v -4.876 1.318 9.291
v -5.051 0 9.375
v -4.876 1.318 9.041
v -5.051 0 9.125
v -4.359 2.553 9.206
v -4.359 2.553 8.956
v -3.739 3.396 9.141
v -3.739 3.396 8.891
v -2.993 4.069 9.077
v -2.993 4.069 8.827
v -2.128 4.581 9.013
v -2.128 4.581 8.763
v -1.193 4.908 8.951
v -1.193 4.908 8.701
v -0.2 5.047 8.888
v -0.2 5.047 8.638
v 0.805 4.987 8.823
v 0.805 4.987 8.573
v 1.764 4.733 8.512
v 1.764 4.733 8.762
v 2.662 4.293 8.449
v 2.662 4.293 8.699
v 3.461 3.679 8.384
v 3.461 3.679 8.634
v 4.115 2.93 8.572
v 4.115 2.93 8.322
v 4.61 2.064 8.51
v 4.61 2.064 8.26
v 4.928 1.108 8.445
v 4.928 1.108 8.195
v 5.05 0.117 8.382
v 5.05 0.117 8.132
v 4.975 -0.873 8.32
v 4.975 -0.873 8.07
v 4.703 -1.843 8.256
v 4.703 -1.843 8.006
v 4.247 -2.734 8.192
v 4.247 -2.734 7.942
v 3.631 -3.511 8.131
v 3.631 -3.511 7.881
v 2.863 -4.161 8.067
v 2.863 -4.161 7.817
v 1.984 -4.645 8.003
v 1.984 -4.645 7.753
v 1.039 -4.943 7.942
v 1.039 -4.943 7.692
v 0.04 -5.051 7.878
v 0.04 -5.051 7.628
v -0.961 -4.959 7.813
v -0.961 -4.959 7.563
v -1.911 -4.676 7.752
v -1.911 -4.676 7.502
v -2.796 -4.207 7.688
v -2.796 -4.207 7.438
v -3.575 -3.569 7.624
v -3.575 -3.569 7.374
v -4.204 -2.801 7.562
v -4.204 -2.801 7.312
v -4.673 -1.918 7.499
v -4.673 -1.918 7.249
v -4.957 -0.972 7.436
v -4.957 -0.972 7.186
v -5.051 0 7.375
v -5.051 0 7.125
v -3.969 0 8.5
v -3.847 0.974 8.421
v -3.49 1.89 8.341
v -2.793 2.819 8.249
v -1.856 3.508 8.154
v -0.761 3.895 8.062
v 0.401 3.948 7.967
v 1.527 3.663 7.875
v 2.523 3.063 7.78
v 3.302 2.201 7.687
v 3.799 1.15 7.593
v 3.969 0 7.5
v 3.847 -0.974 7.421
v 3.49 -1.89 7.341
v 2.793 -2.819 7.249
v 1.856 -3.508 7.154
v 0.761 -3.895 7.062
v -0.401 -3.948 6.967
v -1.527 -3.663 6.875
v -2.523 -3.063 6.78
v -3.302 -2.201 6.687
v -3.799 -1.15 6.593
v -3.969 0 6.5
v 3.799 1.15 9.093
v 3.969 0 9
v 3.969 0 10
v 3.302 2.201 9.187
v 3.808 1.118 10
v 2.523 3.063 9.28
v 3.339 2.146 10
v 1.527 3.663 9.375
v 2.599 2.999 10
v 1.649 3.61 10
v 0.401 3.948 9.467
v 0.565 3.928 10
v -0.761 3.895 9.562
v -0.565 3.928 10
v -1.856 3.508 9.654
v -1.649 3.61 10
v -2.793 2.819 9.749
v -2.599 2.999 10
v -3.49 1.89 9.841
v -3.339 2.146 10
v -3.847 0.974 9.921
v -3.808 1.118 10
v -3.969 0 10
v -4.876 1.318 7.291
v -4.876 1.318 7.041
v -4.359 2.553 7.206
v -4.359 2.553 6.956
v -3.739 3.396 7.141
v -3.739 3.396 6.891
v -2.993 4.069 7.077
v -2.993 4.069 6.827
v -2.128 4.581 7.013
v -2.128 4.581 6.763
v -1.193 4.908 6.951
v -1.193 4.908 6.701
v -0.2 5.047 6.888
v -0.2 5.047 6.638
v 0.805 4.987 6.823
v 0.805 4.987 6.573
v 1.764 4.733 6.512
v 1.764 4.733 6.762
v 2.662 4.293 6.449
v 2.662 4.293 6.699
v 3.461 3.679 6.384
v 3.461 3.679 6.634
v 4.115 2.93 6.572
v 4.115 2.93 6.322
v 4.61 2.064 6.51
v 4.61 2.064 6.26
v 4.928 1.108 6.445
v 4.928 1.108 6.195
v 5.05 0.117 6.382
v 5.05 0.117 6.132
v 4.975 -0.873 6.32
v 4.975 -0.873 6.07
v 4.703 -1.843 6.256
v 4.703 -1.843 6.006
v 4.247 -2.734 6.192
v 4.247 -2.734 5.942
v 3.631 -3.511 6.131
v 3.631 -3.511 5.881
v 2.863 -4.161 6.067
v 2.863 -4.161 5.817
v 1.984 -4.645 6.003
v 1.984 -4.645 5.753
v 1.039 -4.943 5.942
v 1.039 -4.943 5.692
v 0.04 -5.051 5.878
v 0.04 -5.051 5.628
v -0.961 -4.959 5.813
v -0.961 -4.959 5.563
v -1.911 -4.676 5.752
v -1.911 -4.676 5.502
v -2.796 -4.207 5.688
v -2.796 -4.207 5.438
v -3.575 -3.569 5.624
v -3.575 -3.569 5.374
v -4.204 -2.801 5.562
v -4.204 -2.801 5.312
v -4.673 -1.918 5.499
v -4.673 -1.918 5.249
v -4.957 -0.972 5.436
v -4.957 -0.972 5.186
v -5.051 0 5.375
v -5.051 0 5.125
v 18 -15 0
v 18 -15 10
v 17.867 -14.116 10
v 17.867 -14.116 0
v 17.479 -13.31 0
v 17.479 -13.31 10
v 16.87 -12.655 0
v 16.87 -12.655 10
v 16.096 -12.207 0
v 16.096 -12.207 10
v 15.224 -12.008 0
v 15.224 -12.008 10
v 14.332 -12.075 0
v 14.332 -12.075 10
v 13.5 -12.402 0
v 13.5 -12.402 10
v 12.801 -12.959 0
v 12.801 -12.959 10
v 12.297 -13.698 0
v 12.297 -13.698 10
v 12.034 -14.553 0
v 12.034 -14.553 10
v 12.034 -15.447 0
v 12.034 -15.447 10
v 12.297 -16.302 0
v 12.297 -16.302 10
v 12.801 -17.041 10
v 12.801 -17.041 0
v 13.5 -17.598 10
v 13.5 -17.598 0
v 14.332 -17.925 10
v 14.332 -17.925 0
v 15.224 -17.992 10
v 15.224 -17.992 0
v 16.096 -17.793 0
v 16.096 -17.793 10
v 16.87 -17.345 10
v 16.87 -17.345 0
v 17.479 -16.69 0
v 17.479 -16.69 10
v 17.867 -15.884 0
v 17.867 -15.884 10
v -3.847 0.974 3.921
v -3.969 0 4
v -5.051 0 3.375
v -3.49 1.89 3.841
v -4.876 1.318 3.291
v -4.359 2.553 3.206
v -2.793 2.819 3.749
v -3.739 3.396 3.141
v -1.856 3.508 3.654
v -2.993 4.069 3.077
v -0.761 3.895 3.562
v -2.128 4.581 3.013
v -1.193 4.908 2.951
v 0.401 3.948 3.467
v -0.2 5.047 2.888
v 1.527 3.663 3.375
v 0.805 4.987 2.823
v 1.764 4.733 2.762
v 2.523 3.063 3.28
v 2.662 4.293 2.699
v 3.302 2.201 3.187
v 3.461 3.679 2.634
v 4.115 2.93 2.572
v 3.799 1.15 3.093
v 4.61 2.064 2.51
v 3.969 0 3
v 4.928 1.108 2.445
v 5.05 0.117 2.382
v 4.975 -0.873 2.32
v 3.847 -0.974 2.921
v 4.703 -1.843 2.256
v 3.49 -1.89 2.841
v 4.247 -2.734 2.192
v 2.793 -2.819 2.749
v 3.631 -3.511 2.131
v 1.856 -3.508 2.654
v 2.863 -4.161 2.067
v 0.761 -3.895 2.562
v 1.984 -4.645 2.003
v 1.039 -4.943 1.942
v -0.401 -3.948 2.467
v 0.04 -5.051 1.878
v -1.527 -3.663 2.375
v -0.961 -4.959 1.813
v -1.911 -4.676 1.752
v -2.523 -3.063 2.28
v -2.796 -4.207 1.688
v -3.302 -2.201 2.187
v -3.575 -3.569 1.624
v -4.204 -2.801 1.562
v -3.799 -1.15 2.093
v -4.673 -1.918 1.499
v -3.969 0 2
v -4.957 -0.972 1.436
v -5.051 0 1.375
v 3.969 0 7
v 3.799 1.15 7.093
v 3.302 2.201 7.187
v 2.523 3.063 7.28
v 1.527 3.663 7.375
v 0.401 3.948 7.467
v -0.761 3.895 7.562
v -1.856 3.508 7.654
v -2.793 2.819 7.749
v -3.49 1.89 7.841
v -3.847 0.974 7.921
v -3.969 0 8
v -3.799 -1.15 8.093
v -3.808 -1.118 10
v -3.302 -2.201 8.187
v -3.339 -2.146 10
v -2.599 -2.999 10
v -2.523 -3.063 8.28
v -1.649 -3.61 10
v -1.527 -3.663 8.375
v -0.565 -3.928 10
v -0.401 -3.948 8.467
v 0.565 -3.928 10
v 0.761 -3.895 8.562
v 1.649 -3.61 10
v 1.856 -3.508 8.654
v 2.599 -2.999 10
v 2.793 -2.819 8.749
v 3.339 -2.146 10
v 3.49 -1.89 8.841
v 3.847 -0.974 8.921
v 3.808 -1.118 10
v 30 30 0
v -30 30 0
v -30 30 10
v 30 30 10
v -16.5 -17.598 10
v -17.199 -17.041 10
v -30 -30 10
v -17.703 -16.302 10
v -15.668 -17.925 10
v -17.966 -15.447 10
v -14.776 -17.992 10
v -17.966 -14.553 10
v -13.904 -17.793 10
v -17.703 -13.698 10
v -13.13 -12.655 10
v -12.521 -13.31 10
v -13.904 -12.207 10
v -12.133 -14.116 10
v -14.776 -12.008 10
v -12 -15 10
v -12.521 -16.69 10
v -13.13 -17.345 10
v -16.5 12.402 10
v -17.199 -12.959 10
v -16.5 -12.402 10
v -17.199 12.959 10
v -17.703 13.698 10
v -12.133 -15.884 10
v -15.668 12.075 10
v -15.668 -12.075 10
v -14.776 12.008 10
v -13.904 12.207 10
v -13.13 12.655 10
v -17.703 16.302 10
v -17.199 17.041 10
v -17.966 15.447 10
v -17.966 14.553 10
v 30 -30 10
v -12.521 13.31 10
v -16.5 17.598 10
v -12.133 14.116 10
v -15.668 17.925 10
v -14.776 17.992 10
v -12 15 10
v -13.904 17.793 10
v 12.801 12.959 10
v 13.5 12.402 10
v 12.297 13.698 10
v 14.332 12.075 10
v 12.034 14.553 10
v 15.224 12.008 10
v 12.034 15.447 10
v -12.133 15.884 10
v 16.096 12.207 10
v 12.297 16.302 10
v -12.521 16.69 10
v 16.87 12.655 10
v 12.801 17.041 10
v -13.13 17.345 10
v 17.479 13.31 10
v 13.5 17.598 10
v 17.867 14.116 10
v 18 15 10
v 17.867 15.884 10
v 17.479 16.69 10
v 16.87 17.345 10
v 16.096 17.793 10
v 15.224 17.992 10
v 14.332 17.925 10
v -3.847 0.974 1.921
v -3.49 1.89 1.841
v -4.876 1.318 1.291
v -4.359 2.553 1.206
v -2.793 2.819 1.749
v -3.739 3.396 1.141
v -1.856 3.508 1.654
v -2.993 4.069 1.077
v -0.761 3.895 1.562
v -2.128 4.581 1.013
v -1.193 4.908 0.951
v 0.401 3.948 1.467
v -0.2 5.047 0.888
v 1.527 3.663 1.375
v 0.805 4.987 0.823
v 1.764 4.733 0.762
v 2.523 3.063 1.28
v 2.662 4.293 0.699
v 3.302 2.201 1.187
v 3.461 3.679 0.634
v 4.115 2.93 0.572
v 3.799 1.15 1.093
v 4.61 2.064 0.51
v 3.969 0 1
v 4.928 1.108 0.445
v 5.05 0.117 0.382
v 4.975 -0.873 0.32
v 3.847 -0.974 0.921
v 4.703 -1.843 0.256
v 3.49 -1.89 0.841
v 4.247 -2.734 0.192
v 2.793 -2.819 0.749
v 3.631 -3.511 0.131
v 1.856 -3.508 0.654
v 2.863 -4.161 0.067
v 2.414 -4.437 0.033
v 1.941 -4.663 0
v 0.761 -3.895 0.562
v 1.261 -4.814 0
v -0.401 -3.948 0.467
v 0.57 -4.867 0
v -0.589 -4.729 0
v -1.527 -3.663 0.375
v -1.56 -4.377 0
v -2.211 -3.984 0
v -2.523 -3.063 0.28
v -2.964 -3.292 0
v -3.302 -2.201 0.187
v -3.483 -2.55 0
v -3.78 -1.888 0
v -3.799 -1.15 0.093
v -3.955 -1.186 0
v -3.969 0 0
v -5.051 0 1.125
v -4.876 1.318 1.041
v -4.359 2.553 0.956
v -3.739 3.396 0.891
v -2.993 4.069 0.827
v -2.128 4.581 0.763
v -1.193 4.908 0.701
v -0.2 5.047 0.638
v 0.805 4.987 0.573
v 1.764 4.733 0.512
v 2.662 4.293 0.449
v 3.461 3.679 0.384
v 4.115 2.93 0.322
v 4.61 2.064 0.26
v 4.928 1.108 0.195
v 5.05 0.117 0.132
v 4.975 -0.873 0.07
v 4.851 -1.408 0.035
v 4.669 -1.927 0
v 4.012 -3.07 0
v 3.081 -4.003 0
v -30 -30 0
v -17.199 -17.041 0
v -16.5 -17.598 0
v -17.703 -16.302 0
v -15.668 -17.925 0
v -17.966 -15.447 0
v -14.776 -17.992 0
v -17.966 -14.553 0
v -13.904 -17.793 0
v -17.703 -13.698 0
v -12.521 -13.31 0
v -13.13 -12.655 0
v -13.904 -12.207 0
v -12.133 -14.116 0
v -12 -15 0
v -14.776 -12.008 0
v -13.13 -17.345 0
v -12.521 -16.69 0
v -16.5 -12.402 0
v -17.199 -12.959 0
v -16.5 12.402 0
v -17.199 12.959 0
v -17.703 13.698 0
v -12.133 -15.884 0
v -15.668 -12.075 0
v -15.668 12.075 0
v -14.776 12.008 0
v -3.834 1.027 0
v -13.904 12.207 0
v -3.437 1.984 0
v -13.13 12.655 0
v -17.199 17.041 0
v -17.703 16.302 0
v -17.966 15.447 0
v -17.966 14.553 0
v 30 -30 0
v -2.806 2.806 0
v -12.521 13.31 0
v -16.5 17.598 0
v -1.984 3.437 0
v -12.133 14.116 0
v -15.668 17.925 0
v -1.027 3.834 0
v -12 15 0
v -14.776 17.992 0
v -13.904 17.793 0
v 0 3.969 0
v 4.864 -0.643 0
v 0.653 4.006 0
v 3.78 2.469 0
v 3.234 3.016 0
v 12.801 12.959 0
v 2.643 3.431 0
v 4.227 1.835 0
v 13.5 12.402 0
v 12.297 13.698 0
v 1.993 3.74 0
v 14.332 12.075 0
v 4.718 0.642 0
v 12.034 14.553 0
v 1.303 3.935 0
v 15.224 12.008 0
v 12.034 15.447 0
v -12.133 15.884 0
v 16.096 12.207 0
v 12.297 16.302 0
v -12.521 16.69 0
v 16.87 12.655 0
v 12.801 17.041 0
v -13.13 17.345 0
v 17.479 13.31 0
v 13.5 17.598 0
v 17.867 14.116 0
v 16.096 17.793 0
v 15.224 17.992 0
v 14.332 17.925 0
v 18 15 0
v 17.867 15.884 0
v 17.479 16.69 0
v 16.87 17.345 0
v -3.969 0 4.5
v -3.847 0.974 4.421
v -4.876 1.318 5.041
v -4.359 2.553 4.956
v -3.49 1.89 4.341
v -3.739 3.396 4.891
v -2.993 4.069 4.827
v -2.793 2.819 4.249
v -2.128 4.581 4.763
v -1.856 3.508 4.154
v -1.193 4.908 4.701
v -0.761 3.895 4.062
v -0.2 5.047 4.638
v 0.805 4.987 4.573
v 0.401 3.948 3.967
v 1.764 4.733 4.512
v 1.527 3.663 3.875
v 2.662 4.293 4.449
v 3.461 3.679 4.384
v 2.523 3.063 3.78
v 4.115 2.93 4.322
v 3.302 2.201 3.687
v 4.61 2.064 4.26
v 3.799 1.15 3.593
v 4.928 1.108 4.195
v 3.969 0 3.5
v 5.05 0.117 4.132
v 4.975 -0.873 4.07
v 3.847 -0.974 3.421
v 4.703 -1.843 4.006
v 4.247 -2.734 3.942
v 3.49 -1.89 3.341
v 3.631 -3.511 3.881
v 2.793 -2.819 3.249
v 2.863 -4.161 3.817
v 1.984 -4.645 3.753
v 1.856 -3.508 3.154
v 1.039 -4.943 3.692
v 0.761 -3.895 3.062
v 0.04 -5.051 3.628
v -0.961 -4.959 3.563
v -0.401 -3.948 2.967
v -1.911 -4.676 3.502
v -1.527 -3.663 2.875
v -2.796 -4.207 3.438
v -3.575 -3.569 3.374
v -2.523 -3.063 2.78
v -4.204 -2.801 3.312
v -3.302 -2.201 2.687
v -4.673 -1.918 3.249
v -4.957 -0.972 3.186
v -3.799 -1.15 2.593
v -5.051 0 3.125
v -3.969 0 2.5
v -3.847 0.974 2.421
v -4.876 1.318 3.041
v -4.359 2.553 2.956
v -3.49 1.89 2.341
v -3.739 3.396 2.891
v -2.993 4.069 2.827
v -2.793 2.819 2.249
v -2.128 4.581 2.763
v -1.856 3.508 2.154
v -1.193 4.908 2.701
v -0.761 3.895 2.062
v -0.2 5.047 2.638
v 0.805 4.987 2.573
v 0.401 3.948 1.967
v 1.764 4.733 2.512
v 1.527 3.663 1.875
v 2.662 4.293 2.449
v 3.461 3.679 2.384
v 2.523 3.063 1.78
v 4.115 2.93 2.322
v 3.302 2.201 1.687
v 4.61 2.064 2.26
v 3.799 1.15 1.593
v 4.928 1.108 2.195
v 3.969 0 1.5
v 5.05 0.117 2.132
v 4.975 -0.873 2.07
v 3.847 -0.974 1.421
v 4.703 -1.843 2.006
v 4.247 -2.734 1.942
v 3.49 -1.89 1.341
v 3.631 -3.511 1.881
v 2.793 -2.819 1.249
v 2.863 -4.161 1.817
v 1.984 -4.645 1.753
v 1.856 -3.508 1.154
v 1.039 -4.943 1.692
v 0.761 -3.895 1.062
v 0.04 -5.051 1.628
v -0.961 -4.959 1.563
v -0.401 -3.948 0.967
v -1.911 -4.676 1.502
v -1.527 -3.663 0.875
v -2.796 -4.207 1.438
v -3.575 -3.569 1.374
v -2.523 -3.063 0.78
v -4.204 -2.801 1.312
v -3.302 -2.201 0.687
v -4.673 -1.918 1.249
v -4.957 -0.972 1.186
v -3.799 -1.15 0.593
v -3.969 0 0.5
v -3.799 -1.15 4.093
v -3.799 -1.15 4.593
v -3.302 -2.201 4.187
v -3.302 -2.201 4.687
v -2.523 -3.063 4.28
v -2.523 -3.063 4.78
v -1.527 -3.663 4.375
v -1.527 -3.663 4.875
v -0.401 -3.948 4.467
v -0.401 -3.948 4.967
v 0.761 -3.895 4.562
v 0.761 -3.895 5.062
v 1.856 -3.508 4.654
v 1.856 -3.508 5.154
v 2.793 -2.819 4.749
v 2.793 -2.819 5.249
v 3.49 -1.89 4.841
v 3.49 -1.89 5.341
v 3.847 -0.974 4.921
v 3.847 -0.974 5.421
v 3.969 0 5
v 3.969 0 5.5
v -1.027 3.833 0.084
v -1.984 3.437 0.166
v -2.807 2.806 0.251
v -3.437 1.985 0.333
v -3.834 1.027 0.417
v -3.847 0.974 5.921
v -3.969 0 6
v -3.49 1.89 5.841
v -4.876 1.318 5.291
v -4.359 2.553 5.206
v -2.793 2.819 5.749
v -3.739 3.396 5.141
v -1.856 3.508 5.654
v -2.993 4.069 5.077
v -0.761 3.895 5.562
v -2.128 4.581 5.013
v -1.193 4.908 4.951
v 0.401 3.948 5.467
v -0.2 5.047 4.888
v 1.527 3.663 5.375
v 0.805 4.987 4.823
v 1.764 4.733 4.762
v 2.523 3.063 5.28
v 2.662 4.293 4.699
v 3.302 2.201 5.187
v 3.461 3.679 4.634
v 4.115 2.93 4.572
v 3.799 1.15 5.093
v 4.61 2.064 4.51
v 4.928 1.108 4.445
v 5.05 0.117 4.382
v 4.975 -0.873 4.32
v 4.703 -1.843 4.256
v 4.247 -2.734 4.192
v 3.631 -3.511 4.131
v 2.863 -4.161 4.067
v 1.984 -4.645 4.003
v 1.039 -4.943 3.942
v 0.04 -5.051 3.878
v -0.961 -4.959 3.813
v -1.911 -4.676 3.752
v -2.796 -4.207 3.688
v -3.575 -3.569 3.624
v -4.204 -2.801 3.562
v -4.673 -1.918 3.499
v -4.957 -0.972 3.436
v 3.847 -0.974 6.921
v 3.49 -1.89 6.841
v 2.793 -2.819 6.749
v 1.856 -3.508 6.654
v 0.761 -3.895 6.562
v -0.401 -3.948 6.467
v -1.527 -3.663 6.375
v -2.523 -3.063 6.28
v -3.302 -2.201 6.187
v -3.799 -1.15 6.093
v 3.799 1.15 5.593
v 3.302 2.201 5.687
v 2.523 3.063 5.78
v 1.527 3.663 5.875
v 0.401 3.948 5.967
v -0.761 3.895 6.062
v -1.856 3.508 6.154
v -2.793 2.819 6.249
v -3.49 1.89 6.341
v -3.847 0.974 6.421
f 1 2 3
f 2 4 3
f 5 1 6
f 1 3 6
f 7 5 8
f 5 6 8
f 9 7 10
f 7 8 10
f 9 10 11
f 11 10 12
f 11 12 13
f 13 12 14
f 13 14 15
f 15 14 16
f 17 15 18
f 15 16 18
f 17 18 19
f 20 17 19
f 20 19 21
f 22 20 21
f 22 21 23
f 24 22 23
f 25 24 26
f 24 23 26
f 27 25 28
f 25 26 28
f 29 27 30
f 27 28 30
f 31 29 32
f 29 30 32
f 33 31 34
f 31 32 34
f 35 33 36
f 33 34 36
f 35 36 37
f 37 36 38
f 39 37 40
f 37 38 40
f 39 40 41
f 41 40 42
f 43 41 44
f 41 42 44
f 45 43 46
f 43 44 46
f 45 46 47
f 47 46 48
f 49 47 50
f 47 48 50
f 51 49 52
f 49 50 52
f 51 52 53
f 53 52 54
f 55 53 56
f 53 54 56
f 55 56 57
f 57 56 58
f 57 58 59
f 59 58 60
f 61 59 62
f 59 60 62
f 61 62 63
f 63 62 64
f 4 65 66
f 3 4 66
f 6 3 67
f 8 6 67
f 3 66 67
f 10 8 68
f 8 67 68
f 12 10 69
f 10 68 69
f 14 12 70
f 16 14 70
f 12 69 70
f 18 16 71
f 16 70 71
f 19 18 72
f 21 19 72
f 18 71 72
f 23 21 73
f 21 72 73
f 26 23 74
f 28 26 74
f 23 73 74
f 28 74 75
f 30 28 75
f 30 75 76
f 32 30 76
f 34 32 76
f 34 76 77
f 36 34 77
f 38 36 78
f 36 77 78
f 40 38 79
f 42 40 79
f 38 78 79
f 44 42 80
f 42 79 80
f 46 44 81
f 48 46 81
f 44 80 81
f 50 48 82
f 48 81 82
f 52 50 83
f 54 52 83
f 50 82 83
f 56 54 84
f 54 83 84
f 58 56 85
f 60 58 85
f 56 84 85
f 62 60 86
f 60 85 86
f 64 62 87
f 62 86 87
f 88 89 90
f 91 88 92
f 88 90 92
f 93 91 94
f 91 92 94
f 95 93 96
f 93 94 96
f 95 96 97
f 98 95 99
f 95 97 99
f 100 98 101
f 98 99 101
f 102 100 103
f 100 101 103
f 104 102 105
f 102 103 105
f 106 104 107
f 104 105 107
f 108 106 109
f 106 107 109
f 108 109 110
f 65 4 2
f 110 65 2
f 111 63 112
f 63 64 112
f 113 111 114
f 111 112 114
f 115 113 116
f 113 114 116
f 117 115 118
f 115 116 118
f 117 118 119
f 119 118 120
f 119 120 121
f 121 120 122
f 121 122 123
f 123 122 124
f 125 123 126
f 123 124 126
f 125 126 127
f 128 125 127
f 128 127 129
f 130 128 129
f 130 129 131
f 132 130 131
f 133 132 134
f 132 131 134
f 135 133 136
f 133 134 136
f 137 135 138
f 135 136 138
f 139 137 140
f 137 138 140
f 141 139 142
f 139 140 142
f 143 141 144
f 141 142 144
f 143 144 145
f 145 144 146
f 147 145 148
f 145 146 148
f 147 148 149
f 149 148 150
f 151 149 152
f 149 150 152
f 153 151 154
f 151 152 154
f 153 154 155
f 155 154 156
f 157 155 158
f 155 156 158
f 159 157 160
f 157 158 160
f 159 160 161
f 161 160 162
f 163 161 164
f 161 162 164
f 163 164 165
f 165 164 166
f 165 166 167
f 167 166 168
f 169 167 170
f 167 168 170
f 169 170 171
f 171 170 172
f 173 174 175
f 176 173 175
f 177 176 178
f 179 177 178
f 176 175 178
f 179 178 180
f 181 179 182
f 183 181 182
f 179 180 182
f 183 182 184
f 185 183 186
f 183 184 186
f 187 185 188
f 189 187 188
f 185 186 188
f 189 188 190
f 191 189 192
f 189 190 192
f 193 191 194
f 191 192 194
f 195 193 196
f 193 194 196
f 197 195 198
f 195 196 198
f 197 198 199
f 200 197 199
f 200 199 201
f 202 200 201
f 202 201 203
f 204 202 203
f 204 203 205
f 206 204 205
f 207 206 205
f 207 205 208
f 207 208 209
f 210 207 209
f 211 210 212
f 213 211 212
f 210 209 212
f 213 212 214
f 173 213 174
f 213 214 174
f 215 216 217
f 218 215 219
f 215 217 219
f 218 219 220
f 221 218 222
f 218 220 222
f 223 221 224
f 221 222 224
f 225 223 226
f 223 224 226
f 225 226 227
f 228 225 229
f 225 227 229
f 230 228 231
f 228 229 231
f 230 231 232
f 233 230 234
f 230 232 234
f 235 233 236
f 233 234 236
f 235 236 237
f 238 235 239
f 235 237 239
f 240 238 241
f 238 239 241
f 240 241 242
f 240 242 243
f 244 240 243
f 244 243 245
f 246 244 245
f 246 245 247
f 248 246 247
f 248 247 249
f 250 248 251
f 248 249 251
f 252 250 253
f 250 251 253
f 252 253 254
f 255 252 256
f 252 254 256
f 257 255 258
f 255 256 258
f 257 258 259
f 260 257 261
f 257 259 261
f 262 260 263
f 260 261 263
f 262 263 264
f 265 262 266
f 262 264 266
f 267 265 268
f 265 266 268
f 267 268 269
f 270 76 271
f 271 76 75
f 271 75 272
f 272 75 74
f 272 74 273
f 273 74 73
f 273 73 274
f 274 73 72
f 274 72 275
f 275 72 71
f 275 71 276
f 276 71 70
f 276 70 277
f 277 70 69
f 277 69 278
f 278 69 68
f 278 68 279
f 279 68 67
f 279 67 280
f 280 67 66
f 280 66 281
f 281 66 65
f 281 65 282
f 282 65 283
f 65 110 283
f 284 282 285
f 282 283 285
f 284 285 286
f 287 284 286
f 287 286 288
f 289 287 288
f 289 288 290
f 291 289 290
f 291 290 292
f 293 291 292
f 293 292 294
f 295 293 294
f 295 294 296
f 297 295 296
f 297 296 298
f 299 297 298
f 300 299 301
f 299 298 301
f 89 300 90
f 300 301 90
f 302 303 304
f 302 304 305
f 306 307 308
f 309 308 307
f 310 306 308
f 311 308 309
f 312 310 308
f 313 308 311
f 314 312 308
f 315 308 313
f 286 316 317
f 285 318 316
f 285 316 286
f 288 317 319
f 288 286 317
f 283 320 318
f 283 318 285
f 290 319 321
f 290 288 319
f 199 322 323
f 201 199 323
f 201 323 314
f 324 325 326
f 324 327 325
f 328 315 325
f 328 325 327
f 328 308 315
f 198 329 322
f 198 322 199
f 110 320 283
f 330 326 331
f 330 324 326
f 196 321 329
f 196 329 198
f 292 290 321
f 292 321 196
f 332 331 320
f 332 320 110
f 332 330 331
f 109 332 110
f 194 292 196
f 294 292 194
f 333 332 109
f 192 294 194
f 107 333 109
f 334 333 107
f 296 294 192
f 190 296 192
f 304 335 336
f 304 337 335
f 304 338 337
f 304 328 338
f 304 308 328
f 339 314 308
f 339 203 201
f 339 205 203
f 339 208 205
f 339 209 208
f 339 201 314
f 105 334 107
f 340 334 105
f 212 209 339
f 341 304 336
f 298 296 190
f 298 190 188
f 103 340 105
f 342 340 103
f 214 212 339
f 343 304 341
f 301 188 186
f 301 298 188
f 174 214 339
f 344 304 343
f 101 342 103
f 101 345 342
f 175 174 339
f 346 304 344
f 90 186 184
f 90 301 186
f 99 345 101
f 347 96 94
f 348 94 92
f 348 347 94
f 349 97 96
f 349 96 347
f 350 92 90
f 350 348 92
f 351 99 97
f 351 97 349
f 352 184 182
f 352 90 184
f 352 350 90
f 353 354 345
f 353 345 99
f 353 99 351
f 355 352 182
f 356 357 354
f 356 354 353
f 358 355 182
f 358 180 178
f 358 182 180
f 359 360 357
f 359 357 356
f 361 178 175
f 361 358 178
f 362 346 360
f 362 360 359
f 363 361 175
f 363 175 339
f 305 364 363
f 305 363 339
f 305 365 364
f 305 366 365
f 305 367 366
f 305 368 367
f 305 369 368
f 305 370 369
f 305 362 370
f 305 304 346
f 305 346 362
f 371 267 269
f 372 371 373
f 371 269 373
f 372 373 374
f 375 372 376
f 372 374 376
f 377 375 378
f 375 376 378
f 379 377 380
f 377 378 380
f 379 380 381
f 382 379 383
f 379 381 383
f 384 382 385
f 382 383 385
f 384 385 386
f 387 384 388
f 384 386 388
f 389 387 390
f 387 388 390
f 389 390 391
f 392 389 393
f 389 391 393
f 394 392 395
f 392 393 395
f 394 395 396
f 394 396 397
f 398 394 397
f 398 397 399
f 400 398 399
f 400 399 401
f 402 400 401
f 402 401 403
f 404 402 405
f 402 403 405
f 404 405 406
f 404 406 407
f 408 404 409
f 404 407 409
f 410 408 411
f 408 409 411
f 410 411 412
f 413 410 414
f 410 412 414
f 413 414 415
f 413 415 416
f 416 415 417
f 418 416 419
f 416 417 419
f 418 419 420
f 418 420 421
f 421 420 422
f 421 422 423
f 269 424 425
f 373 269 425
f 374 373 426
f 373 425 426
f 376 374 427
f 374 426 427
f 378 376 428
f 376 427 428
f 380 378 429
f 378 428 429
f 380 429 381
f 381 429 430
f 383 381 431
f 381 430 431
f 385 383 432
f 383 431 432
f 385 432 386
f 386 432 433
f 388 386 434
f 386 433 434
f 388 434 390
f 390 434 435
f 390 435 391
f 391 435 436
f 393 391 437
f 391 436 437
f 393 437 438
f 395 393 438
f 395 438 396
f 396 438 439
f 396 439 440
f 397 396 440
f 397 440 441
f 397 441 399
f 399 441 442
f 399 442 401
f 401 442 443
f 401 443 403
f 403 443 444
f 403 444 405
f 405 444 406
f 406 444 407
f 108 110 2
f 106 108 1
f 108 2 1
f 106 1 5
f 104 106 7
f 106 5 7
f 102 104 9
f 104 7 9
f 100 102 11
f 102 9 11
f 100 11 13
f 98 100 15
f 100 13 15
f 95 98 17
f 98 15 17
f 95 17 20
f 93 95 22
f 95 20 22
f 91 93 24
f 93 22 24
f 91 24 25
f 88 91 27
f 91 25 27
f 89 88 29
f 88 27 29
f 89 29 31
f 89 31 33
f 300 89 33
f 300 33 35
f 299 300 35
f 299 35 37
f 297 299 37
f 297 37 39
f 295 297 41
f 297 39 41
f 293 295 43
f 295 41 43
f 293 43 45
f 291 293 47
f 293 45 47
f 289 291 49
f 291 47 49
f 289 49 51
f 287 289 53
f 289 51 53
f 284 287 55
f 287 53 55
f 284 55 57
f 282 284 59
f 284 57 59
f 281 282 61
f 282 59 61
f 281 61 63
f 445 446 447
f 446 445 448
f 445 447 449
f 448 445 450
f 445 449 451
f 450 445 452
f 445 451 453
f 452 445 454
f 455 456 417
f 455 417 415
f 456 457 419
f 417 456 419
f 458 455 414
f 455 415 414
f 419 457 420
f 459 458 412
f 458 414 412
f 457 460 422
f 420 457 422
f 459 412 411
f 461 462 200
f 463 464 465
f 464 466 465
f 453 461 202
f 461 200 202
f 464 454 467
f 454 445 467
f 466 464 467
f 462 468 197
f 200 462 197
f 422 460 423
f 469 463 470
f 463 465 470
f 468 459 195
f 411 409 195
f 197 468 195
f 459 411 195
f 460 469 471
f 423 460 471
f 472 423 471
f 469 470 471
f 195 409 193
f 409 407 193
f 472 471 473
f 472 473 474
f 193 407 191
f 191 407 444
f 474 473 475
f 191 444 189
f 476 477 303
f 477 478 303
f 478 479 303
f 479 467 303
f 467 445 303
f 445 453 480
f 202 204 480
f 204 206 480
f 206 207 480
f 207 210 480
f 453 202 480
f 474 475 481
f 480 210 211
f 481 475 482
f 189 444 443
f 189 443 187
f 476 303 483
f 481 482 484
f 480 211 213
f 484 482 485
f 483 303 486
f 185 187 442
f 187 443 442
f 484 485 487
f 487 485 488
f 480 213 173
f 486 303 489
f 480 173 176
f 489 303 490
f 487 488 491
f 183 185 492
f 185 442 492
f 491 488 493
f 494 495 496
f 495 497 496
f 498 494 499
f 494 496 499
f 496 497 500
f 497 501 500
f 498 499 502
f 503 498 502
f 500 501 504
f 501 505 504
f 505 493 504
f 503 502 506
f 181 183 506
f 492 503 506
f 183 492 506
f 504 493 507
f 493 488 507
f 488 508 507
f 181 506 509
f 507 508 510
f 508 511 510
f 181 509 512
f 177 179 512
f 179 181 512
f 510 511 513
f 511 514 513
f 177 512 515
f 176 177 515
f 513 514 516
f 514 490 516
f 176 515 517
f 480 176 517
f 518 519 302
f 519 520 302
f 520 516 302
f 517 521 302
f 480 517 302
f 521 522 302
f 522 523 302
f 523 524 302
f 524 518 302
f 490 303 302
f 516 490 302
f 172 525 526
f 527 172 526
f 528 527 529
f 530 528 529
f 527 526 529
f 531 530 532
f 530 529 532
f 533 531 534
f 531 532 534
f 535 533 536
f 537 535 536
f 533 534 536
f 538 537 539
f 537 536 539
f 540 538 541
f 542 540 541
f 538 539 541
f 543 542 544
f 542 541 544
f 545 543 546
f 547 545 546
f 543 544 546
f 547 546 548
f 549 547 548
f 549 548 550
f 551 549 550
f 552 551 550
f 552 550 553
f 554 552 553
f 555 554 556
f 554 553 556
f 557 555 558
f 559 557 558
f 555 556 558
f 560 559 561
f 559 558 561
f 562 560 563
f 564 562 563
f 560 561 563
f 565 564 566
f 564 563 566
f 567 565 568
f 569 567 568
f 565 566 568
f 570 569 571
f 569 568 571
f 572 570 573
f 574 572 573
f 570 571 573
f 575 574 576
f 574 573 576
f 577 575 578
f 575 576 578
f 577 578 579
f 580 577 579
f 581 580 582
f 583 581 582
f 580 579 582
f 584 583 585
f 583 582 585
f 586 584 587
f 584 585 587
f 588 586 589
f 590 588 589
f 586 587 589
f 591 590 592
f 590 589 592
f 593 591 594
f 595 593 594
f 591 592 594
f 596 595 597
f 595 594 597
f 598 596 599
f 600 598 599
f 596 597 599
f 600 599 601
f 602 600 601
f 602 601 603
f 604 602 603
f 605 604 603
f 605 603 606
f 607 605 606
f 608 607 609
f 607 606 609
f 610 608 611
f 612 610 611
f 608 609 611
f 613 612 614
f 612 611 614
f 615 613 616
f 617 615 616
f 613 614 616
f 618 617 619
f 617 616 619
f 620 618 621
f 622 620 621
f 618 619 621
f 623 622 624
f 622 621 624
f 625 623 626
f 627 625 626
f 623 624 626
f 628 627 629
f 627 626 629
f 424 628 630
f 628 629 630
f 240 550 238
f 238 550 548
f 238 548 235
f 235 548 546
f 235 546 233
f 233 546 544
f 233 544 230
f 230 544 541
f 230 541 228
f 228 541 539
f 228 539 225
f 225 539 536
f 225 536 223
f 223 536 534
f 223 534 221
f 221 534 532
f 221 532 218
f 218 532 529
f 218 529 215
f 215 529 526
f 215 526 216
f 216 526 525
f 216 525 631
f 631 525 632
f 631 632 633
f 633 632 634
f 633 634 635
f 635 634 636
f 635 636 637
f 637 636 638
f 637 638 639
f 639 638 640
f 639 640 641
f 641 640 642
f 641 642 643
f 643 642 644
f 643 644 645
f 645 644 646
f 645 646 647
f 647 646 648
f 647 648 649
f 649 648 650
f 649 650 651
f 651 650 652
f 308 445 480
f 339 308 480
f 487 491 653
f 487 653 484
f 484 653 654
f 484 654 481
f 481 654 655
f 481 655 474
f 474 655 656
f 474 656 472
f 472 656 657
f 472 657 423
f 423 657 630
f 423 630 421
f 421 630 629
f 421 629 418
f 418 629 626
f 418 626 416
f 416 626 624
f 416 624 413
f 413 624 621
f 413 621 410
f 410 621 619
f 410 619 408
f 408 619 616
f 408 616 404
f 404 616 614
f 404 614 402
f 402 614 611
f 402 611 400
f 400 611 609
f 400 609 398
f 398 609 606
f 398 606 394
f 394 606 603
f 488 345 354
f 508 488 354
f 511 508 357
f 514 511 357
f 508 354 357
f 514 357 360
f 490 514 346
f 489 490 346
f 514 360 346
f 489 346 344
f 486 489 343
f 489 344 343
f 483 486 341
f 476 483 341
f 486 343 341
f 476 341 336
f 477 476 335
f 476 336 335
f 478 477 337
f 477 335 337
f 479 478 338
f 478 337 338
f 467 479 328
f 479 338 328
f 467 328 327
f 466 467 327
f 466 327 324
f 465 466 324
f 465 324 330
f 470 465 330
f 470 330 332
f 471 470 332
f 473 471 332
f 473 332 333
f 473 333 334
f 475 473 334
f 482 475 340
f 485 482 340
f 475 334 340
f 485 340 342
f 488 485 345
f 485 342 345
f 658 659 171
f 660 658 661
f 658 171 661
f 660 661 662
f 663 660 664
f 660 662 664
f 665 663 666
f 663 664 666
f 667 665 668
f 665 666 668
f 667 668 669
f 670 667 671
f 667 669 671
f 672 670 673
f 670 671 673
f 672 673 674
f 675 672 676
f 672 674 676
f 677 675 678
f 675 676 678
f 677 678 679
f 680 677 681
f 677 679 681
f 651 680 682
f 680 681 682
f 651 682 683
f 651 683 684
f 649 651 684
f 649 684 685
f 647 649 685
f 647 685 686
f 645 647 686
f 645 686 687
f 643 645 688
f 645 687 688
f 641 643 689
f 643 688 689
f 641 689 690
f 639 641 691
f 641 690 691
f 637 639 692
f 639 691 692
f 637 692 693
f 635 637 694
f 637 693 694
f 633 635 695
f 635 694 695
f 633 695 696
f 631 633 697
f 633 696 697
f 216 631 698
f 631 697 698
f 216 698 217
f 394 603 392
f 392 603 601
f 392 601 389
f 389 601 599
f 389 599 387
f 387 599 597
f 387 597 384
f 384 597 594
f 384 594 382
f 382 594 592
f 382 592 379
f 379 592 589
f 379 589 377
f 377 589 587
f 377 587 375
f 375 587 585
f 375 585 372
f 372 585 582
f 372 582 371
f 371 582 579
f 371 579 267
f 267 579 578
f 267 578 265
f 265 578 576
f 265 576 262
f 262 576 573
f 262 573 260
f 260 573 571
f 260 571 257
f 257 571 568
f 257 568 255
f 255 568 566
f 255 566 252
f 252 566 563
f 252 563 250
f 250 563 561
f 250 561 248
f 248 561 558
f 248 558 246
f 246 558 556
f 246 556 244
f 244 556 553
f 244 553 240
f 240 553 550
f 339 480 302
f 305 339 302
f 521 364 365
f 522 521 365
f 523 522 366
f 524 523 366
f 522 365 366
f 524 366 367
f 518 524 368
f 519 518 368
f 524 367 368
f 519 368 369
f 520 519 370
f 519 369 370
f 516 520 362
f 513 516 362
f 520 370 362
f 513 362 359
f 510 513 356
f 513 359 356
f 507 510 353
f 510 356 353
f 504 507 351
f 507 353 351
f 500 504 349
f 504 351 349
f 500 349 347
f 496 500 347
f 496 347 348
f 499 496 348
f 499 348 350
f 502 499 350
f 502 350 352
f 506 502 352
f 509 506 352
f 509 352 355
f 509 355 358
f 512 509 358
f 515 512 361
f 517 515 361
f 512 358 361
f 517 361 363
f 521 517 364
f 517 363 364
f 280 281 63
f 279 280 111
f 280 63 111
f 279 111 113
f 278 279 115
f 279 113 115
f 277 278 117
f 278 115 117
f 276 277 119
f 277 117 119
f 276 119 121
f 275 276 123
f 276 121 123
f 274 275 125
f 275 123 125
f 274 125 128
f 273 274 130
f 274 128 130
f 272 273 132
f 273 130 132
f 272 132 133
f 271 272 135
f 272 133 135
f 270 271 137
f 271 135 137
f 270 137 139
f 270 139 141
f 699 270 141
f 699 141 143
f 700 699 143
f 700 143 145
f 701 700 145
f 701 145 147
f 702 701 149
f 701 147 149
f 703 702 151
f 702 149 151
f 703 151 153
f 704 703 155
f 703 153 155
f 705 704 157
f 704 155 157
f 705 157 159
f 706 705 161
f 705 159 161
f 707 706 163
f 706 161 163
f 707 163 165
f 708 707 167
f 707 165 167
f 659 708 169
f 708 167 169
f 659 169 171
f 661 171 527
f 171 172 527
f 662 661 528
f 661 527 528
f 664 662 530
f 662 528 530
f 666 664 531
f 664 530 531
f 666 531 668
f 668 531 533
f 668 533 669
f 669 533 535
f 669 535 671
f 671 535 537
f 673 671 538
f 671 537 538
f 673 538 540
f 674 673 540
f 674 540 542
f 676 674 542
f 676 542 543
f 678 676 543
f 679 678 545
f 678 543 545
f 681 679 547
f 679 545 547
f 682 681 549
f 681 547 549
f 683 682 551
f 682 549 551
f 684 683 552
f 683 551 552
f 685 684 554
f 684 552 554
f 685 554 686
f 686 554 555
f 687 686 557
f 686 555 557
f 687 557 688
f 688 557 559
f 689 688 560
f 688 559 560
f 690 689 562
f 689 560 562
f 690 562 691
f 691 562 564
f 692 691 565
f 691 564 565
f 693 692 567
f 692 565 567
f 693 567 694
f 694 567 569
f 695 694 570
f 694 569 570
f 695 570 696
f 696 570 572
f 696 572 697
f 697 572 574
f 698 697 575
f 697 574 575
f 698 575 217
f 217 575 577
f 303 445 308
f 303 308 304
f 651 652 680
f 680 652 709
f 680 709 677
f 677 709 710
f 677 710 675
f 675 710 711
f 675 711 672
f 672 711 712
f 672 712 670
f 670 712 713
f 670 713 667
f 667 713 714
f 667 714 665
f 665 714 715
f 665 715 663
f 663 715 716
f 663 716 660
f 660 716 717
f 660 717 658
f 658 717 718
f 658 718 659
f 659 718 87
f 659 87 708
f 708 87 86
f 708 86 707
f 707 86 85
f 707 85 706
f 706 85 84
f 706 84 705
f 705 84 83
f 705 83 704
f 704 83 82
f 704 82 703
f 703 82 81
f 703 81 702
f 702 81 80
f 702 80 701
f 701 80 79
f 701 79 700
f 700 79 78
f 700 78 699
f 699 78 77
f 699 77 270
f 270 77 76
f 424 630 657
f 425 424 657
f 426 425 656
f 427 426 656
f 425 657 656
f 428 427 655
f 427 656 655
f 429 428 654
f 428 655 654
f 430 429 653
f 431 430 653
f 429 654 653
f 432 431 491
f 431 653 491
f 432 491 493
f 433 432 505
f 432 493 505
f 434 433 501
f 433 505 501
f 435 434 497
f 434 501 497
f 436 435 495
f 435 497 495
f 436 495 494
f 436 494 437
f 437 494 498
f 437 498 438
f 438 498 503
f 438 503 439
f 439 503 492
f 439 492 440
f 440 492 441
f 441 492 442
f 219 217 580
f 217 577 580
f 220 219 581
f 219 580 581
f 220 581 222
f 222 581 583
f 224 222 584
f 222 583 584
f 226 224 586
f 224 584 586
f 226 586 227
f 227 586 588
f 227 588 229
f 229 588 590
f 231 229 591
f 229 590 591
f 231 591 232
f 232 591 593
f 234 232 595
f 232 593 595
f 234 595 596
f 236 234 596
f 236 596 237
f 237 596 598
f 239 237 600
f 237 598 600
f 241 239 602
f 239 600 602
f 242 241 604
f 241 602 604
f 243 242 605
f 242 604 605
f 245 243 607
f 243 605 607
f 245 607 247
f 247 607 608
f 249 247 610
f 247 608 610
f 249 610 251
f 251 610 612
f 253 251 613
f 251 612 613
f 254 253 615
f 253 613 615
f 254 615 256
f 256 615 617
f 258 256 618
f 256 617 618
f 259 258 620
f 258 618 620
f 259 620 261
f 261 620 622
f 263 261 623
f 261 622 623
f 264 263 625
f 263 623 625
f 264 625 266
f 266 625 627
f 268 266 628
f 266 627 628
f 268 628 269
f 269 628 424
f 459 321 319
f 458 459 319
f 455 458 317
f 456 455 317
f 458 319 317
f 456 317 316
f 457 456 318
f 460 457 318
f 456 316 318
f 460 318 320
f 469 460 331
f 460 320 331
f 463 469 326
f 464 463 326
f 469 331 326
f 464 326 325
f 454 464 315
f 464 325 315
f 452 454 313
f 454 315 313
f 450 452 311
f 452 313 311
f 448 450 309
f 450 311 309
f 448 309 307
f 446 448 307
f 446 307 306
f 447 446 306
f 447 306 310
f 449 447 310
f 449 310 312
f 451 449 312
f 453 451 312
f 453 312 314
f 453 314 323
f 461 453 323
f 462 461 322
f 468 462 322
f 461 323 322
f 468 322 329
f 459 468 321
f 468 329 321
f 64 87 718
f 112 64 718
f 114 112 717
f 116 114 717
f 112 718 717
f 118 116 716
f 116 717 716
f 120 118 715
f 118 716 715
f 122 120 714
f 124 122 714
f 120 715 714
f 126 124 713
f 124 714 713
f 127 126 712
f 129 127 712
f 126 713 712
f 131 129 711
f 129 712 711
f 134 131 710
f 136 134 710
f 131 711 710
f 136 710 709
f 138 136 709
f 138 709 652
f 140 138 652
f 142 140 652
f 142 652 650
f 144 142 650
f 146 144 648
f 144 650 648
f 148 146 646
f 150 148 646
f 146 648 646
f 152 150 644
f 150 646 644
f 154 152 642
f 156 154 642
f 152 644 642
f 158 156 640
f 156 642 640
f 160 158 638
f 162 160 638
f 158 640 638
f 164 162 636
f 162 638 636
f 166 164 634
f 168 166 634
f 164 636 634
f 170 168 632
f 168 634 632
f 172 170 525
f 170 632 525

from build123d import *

# Parameters (mm, degrees)
SKETCH1_W           = 60
SKETCH1_H           = 60
BOSS_EXTRUDE1_DEPTH = 10
SKETCH2_R           = 3.96875
CUT_EXTRUDE1_DEPTH  = 44.588989435
THREAD1_PITCH       = 2
SKETCH3_R           = 3
CUT_EXTRUDE2_DEPTH  = 10


with BuildPart() as part:
    # Sketch1 → Boss-Extrude1 (new body)
    with BuildSketch(Plane.XY):
        Rectangle(SKETCH1_W, SKETCH1_H)
    extrude(amount=BOSS_EXTRUDE1_DEPTH)

    # Sketch2 → Cut-Extrude1 (cut, through all)
    with BuildSketch(Plane.XY.offset(10)):
        Circle(SKETCH2_R)
    extrude(amount=-CUT_EXTRUDE1_DEPTH, mode=Mode.SUBTRACT)

    # Thread1: the profile of Thread Profile1 profile screwed along a right-hand helix of 5 turns, 10 arcs to a turn; built about Z, then put on its axis
    thread1_z = Axis((0, 0, 0), (0, 0, 1))
    thread1_corners = [(3.96845, 0, -0.000173205), (5.05128175, 0, 0.624999997), (5.05128175, 0, 0.874999997), (3.96845, 0, 1.5001732)]
    with BuildLine(mode=Mode.PRIVATE) as thread1_profile:
        Line(thread1_corners[0], thread1_corners[1])
        Line(thread1_corners[1], thread1_corners[2])
        Line(thread1_corners[2], thread1_corners[3])
        Line(thread1_corners[3], thread1_corners[0])
    thread1_cap = Face(thread1_profile.wire())
    thread1_turn_angles = [0, 18, 36, 54, 72, 90, 108, 126, 144, 162, 180, 198, 216, 234, 252, 270, 288, 306, 324, 342, 360]
    thread1_turn_weights = [1, 0.9510565162951535, 1, 0.9510565162951535, 1, 0.9510565162951535, 1, 0.9510565162951535, 1, 0.9510565162951535, 1, 0.9510565162951535, 1, 0.9510565162951535, 1, 0.9510565162951535, 1, 0.9510565162951535, 1, 0.9510565162951535, 1]
    thread1_turn_rails = [Edge.make_bspline([Vector(p[0], p[1], 0).rotate(thread1_z, thread1_turn_angles[k]) / thread1_turn_weights[k] + Vector(0, 0, p[2] + THREAD1_PITCH * thread1_turn_angles[k] / 360) for k in range(21)], [0, 0, 0, 1, 1, 2, 2, 3, 3, 4, 4, 5, 5, 6, 6, 7, 7, 8, 8, 9, 9, 10, 10, 10], 2, thread1_turn_weights) for p in thread1_corners]
    thread1_turn_sides = [Face.make_surface_from_curves(thread1_turn_rails[p[0]], thread1_turn_rails[p[1]]) for p in [(0, 1), (1, 2), (2, 3), (3, 0)]]
    thread1 = Plane(origin=(0, 0, 10), x_dir=(-1, 0, 0), z_dir=(0, 0, -1)) * Solid(Shell([*[p.moved(Location((0, 0, THREAD1_PITCH * i))) for i in range(5) for p in thread1_turn_sides], thread1_cap, thread1_cap.rotate(thread1_z, 1800).moved(Location((0, 0, THREAD1_PITCH * 1800 / 360)))]))
    add(thread1, mode=Mode.SUBTRACT)

    # Sketch3 → Cut-Extrude2 (cut)
    with BuildSketch(Plane.XY.offset(10)):
        with Locations((15, 15)):
            Circle(SKETCH3_R)
        with Locations((-15, 15)):
            Circle(SKETCH3_R)
        with Locations((-15, -15)):
            Circle(SKETCH3_R)
        with Locations((15, -15)):
            Circle(SKETCH3_R)
    extrude(amount=-CUT_EXTRUDE2_DEPTH, mode=Mode.SUBTRACT)


solid = part.part
